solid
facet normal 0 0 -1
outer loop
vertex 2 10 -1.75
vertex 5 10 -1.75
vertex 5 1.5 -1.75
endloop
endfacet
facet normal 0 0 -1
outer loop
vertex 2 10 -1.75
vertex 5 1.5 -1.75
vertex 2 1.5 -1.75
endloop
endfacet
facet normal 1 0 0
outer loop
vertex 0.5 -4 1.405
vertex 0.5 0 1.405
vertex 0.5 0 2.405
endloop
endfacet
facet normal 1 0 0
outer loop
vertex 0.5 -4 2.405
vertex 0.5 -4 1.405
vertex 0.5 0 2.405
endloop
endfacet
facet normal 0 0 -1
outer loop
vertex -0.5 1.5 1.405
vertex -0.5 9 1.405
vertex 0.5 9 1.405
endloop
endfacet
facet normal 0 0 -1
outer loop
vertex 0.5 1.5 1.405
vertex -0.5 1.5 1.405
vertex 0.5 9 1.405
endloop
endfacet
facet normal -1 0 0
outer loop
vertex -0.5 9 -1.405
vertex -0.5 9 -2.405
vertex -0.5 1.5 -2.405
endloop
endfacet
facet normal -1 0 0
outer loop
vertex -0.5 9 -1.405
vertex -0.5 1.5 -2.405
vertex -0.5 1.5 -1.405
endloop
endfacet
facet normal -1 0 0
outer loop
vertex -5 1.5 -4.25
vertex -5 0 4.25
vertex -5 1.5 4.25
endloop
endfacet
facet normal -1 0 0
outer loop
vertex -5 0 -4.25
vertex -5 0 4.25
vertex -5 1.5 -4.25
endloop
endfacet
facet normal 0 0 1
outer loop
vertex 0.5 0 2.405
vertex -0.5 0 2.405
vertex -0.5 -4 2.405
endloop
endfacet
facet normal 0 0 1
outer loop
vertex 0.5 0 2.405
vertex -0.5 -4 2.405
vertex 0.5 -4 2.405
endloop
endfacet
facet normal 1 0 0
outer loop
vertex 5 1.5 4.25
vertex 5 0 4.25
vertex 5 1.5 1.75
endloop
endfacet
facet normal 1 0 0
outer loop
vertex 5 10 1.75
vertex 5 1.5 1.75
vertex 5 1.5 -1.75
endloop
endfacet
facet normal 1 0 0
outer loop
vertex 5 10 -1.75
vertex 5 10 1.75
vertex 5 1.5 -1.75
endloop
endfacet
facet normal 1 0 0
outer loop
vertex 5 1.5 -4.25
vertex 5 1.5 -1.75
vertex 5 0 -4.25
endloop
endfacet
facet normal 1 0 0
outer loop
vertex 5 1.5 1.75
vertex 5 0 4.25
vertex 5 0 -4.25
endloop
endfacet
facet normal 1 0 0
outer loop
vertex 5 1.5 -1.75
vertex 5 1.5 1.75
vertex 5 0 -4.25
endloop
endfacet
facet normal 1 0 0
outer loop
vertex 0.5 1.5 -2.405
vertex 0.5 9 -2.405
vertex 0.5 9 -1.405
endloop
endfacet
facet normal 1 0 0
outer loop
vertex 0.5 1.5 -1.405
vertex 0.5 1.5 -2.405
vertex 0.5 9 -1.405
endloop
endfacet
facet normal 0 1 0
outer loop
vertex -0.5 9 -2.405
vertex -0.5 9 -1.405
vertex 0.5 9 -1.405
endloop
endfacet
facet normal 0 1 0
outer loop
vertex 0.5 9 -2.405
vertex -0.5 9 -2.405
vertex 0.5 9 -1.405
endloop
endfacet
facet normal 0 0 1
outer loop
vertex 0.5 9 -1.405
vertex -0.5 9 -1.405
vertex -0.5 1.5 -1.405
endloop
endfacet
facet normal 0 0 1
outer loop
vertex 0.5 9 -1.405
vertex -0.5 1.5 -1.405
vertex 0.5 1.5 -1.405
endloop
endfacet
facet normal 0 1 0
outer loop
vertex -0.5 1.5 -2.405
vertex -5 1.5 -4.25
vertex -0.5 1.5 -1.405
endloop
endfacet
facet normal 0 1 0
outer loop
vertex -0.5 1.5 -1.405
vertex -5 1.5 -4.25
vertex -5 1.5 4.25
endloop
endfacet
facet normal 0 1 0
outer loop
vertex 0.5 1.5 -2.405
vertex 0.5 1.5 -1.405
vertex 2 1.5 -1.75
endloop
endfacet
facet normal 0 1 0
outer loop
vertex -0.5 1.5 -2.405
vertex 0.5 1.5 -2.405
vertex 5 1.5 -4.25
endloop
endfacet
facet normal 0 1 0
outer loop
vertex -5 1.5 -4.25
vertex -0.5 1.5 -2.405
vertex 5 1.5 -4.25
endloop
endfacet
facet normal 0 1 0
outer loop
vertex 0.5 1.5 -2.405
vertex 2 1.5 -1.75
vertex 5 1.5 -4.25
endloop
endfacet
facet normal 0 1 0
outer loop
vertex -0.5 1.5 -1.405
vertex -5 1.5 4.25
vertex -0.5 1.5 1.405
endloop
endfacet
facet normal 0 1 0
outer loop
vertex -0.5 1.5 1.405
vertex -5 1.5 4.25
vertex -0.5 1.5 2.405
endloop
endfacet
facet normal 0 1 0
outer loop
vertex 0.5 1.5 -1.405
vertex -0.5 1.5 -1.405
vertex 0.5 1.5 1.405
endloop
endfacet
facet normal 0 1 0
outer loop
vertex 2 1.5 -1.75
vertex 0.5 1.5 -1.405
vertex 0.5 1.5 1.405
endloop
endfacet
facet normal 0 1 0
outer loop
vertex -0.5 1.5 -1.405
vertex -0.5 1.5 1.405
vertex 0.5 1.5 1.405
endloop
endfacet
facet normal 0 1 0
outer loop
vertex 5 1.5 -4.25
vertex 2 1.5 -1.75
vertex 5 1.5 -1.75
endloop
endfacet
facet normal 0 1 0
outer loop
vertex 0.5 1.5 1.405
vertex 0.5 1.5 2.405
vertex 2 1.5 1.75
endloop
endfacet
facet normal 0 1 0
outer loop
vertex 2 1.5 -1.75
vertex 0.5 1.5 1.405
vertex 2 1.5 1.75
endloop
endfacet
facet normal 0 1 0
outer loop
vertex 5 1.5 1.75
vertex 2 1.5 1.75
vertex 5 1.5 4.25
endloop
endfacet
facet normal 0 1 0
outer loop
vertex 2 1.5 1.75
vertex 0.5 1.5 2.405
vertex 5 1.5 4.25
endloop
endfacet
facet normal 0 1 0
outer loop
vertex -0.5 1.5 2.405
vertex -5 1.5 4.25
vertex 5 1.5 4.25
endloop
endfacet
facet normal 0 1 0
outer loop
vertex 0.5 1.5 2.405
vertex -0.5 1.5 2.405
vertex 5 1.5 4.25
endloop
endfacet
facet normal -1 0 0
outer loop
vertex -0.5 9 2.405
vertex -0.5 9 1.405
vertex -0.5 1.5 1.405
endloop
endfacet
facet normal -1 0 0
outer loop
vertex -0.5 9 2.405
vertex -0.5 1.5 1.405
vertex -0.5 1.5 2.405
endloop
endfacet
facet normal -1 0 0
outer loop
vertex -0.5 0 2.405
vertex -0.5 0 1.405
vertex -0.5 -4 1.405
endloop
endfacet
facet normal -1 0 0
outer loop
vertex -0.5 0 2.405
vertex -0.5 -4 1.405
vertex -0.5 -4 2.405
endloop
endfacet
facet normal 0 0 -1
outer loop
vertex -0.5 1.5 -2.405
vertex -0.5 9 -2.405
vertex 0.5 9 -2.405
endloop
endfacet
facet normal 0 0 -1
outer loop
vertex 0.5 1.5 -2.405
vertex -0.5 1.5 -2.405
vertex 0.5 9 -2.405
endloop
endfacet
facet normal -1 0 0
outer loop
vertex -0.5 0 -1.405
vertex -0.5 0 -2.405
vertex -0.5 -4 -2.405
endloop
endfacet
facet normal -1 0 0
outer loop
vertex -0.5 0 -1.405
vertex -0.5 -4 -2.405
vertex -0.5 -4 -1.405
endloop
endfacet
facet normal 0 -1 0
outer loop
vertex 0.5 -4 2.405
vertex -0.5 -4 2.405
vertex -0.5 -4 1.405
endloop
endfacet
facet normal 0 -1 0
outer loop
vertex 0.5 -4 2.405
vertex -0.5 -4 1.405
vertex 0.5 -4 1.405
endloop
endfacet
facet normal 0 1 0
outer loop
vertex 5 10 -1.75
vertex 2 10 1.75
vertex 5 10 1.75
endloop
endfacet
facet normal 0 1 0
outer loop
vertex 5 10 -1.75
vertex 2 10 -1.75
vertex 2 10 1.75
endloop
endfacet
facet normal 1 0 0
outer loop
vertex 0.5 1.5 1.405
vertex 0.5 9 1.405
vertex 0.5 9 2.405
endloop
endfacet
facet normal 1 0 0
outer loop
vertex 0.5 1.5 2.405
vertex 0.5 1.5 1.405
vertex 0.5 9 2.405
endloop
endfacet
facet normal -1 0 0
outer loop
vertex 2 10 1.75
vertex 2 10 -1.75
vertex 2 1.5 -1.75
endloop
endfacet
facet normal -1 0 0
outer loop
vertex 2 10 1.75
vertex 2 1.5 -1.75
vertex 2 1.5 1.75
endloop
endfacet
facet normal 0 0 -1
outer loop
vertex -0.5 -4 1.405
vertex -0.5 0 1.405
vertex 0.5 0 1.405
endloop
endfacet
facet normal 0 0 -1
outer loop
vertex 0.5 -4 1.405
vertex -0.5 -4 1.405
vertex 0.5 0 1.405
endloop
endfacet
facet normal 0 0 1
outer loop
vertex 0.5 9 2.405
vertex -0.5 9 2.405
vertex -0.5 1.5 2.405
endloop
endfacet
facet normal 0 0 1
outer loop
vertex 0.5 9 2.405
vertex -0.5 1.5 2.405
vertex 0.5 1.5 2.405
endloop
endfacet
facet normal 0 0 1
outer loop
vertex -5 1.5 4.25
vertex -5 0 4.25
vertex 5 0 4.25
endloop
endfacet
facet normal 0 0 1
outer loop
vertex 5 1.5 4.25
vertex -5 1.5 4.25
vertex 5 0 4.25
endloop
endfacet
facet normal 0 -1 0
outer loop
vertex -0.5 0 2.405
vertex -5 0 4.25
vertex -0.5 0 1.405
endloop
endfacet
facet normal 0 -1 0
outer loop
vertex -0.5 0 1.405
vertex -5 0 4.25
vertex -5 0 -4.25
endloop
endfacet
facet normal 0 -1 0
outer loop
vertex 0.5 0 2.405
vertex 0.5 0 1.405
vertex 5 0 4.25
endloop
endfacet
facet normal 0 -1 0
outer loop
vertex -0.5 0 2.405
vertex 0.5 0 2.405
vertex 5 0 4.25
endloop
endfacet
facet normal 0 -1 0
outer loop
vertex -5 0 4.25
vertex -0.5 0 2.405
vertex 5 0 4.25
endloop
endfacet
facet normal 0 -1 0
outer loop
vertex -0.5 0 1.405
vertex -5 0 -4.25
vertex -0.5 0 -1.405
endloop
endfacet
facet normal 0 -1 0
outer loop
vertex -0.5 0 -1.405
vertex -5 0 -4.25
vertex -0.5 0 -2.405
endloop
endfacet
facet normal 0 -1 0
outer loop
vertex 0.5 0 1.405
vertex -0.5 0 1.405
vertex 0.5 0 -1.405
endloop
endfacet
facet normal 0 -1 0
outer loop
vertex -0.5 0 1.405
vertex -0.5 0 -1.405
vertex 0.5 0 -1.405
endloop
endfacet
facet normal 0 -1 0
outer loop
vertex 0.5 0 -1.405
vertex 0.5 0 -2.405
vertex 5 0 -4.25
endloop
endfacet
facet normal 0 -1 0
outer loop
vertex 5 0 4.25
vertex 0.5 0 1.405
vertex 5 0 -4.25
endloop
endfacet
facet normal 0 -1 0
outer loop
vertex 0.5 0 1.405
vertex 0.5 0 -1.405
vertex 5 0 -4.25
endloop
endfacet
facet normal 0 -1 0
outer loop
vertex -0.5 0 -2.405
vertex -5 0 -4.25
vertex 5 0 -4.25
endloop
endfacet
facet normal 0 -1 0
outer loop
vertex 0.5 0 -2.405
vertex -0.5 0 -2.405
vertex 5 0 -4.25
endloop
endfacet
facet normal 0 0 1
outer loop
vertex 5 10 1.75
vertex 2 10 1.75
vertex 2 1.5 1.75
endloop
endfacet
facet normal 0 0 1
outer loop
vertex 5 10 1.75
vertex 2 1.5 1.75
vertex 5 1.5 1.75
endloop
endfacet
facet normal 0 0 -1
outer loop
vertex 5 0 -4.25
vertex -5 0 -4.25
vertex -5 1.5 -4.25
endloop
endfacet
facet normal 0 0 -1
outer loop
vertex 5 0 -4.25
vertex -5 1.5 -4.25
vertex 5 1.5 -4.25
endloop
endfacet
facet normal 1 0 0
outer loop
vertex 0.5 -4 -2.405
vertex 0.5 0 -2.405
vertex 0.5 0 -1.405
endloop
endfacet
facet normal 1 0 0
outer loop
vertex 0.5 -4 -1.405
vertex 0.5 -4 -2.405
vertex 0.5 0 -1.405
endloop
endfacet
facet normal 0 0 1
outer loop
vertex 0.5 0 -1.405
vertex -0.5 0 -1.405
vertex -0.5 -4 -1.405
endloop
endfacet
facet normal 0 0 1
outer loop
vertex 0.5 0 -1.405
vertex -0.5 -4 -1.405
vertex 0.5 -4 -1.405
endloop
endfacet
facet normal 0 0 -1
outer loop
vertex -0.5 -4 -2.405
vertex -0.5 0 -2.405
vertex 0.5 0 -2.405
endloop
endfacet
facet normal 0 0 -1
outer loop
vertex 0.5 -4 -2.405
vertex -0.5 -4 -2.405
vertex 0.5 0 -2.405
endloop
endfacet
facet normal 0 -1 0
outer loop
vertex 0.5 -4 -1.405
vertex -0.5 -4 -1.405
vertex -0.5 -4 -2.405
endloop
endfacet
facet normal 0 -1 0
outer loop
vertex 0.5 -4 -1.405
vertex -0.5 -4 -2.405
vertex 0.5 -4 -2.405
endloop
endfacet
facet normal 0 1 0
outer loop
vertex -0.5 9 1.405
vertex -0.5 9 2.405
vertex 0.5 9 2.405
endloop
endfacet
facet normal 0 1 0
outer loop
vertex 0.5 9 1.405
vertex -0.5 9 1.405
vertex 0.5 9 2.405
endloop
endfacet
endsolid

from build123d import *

# Parameters (mm, degrees)
SKETCH_1_W           = 10
SKETCH_1_H           = 8.5
EXTRUDE_1_DEPTH      = 10
CUT_EXTRUDE_1_DEPTH  = 8.5
EXTRUDE_2_DEPTH      = 4
EXTRUDE_2_DEPTH_BACK = 9
SKETCH_3_W           = 1
SKETCH_3_H           = 1


with BuildPart() as part:
    # 草图1 → 拉伸1 (new body)
    with BuildSketch(Plane(origin=(0, 0, 0), x_dir=(1, 0, 0), z_dir=(0, 1, 0))):
        Rectangle(SKETCH_1_W, SKETCH_1_H)
    extrude(amount=EXTRUDE_1_DEPTH)

    # 草图2 → 切除-拉伸1 (cut)
    with BuildSketch(Plane(origin=(0, 10, 0), x_dir=(-1, 0, 0), z_dir=(0, 1, 0))):
        Polygon((-5, 1.75), (-5, 4.25), (5, 4.25), (5, -4.25), (-5, -4.25), (-5, -1.75), (-2, -1.75), (-2, 1.75), align=None)
    extrude(amount=-CUT_EXTRUDE_1_DEPTH, mode=Mode.SUBTRACT)

    # 草图3 → 拉伸2 (add, two sides: drawn at the far end of the back side and taken through both)
    with BuildSketch(Plane.XZ.offset(-EXTRUDE_2_DEPTH_BACK)):
        with Locations((0, 1.905)):
            Rectangle(SKETCH_3_W, SKETCH_3_H)
        with Locations((0, -1.905)):
            Rectangle(SKETCH_3_W, SKETCH_3_H)
    extrude(amount=EXTRUDE_2_DEPTH + EXTRUDE_2_DEPTH_BACK)


solid = part.part
